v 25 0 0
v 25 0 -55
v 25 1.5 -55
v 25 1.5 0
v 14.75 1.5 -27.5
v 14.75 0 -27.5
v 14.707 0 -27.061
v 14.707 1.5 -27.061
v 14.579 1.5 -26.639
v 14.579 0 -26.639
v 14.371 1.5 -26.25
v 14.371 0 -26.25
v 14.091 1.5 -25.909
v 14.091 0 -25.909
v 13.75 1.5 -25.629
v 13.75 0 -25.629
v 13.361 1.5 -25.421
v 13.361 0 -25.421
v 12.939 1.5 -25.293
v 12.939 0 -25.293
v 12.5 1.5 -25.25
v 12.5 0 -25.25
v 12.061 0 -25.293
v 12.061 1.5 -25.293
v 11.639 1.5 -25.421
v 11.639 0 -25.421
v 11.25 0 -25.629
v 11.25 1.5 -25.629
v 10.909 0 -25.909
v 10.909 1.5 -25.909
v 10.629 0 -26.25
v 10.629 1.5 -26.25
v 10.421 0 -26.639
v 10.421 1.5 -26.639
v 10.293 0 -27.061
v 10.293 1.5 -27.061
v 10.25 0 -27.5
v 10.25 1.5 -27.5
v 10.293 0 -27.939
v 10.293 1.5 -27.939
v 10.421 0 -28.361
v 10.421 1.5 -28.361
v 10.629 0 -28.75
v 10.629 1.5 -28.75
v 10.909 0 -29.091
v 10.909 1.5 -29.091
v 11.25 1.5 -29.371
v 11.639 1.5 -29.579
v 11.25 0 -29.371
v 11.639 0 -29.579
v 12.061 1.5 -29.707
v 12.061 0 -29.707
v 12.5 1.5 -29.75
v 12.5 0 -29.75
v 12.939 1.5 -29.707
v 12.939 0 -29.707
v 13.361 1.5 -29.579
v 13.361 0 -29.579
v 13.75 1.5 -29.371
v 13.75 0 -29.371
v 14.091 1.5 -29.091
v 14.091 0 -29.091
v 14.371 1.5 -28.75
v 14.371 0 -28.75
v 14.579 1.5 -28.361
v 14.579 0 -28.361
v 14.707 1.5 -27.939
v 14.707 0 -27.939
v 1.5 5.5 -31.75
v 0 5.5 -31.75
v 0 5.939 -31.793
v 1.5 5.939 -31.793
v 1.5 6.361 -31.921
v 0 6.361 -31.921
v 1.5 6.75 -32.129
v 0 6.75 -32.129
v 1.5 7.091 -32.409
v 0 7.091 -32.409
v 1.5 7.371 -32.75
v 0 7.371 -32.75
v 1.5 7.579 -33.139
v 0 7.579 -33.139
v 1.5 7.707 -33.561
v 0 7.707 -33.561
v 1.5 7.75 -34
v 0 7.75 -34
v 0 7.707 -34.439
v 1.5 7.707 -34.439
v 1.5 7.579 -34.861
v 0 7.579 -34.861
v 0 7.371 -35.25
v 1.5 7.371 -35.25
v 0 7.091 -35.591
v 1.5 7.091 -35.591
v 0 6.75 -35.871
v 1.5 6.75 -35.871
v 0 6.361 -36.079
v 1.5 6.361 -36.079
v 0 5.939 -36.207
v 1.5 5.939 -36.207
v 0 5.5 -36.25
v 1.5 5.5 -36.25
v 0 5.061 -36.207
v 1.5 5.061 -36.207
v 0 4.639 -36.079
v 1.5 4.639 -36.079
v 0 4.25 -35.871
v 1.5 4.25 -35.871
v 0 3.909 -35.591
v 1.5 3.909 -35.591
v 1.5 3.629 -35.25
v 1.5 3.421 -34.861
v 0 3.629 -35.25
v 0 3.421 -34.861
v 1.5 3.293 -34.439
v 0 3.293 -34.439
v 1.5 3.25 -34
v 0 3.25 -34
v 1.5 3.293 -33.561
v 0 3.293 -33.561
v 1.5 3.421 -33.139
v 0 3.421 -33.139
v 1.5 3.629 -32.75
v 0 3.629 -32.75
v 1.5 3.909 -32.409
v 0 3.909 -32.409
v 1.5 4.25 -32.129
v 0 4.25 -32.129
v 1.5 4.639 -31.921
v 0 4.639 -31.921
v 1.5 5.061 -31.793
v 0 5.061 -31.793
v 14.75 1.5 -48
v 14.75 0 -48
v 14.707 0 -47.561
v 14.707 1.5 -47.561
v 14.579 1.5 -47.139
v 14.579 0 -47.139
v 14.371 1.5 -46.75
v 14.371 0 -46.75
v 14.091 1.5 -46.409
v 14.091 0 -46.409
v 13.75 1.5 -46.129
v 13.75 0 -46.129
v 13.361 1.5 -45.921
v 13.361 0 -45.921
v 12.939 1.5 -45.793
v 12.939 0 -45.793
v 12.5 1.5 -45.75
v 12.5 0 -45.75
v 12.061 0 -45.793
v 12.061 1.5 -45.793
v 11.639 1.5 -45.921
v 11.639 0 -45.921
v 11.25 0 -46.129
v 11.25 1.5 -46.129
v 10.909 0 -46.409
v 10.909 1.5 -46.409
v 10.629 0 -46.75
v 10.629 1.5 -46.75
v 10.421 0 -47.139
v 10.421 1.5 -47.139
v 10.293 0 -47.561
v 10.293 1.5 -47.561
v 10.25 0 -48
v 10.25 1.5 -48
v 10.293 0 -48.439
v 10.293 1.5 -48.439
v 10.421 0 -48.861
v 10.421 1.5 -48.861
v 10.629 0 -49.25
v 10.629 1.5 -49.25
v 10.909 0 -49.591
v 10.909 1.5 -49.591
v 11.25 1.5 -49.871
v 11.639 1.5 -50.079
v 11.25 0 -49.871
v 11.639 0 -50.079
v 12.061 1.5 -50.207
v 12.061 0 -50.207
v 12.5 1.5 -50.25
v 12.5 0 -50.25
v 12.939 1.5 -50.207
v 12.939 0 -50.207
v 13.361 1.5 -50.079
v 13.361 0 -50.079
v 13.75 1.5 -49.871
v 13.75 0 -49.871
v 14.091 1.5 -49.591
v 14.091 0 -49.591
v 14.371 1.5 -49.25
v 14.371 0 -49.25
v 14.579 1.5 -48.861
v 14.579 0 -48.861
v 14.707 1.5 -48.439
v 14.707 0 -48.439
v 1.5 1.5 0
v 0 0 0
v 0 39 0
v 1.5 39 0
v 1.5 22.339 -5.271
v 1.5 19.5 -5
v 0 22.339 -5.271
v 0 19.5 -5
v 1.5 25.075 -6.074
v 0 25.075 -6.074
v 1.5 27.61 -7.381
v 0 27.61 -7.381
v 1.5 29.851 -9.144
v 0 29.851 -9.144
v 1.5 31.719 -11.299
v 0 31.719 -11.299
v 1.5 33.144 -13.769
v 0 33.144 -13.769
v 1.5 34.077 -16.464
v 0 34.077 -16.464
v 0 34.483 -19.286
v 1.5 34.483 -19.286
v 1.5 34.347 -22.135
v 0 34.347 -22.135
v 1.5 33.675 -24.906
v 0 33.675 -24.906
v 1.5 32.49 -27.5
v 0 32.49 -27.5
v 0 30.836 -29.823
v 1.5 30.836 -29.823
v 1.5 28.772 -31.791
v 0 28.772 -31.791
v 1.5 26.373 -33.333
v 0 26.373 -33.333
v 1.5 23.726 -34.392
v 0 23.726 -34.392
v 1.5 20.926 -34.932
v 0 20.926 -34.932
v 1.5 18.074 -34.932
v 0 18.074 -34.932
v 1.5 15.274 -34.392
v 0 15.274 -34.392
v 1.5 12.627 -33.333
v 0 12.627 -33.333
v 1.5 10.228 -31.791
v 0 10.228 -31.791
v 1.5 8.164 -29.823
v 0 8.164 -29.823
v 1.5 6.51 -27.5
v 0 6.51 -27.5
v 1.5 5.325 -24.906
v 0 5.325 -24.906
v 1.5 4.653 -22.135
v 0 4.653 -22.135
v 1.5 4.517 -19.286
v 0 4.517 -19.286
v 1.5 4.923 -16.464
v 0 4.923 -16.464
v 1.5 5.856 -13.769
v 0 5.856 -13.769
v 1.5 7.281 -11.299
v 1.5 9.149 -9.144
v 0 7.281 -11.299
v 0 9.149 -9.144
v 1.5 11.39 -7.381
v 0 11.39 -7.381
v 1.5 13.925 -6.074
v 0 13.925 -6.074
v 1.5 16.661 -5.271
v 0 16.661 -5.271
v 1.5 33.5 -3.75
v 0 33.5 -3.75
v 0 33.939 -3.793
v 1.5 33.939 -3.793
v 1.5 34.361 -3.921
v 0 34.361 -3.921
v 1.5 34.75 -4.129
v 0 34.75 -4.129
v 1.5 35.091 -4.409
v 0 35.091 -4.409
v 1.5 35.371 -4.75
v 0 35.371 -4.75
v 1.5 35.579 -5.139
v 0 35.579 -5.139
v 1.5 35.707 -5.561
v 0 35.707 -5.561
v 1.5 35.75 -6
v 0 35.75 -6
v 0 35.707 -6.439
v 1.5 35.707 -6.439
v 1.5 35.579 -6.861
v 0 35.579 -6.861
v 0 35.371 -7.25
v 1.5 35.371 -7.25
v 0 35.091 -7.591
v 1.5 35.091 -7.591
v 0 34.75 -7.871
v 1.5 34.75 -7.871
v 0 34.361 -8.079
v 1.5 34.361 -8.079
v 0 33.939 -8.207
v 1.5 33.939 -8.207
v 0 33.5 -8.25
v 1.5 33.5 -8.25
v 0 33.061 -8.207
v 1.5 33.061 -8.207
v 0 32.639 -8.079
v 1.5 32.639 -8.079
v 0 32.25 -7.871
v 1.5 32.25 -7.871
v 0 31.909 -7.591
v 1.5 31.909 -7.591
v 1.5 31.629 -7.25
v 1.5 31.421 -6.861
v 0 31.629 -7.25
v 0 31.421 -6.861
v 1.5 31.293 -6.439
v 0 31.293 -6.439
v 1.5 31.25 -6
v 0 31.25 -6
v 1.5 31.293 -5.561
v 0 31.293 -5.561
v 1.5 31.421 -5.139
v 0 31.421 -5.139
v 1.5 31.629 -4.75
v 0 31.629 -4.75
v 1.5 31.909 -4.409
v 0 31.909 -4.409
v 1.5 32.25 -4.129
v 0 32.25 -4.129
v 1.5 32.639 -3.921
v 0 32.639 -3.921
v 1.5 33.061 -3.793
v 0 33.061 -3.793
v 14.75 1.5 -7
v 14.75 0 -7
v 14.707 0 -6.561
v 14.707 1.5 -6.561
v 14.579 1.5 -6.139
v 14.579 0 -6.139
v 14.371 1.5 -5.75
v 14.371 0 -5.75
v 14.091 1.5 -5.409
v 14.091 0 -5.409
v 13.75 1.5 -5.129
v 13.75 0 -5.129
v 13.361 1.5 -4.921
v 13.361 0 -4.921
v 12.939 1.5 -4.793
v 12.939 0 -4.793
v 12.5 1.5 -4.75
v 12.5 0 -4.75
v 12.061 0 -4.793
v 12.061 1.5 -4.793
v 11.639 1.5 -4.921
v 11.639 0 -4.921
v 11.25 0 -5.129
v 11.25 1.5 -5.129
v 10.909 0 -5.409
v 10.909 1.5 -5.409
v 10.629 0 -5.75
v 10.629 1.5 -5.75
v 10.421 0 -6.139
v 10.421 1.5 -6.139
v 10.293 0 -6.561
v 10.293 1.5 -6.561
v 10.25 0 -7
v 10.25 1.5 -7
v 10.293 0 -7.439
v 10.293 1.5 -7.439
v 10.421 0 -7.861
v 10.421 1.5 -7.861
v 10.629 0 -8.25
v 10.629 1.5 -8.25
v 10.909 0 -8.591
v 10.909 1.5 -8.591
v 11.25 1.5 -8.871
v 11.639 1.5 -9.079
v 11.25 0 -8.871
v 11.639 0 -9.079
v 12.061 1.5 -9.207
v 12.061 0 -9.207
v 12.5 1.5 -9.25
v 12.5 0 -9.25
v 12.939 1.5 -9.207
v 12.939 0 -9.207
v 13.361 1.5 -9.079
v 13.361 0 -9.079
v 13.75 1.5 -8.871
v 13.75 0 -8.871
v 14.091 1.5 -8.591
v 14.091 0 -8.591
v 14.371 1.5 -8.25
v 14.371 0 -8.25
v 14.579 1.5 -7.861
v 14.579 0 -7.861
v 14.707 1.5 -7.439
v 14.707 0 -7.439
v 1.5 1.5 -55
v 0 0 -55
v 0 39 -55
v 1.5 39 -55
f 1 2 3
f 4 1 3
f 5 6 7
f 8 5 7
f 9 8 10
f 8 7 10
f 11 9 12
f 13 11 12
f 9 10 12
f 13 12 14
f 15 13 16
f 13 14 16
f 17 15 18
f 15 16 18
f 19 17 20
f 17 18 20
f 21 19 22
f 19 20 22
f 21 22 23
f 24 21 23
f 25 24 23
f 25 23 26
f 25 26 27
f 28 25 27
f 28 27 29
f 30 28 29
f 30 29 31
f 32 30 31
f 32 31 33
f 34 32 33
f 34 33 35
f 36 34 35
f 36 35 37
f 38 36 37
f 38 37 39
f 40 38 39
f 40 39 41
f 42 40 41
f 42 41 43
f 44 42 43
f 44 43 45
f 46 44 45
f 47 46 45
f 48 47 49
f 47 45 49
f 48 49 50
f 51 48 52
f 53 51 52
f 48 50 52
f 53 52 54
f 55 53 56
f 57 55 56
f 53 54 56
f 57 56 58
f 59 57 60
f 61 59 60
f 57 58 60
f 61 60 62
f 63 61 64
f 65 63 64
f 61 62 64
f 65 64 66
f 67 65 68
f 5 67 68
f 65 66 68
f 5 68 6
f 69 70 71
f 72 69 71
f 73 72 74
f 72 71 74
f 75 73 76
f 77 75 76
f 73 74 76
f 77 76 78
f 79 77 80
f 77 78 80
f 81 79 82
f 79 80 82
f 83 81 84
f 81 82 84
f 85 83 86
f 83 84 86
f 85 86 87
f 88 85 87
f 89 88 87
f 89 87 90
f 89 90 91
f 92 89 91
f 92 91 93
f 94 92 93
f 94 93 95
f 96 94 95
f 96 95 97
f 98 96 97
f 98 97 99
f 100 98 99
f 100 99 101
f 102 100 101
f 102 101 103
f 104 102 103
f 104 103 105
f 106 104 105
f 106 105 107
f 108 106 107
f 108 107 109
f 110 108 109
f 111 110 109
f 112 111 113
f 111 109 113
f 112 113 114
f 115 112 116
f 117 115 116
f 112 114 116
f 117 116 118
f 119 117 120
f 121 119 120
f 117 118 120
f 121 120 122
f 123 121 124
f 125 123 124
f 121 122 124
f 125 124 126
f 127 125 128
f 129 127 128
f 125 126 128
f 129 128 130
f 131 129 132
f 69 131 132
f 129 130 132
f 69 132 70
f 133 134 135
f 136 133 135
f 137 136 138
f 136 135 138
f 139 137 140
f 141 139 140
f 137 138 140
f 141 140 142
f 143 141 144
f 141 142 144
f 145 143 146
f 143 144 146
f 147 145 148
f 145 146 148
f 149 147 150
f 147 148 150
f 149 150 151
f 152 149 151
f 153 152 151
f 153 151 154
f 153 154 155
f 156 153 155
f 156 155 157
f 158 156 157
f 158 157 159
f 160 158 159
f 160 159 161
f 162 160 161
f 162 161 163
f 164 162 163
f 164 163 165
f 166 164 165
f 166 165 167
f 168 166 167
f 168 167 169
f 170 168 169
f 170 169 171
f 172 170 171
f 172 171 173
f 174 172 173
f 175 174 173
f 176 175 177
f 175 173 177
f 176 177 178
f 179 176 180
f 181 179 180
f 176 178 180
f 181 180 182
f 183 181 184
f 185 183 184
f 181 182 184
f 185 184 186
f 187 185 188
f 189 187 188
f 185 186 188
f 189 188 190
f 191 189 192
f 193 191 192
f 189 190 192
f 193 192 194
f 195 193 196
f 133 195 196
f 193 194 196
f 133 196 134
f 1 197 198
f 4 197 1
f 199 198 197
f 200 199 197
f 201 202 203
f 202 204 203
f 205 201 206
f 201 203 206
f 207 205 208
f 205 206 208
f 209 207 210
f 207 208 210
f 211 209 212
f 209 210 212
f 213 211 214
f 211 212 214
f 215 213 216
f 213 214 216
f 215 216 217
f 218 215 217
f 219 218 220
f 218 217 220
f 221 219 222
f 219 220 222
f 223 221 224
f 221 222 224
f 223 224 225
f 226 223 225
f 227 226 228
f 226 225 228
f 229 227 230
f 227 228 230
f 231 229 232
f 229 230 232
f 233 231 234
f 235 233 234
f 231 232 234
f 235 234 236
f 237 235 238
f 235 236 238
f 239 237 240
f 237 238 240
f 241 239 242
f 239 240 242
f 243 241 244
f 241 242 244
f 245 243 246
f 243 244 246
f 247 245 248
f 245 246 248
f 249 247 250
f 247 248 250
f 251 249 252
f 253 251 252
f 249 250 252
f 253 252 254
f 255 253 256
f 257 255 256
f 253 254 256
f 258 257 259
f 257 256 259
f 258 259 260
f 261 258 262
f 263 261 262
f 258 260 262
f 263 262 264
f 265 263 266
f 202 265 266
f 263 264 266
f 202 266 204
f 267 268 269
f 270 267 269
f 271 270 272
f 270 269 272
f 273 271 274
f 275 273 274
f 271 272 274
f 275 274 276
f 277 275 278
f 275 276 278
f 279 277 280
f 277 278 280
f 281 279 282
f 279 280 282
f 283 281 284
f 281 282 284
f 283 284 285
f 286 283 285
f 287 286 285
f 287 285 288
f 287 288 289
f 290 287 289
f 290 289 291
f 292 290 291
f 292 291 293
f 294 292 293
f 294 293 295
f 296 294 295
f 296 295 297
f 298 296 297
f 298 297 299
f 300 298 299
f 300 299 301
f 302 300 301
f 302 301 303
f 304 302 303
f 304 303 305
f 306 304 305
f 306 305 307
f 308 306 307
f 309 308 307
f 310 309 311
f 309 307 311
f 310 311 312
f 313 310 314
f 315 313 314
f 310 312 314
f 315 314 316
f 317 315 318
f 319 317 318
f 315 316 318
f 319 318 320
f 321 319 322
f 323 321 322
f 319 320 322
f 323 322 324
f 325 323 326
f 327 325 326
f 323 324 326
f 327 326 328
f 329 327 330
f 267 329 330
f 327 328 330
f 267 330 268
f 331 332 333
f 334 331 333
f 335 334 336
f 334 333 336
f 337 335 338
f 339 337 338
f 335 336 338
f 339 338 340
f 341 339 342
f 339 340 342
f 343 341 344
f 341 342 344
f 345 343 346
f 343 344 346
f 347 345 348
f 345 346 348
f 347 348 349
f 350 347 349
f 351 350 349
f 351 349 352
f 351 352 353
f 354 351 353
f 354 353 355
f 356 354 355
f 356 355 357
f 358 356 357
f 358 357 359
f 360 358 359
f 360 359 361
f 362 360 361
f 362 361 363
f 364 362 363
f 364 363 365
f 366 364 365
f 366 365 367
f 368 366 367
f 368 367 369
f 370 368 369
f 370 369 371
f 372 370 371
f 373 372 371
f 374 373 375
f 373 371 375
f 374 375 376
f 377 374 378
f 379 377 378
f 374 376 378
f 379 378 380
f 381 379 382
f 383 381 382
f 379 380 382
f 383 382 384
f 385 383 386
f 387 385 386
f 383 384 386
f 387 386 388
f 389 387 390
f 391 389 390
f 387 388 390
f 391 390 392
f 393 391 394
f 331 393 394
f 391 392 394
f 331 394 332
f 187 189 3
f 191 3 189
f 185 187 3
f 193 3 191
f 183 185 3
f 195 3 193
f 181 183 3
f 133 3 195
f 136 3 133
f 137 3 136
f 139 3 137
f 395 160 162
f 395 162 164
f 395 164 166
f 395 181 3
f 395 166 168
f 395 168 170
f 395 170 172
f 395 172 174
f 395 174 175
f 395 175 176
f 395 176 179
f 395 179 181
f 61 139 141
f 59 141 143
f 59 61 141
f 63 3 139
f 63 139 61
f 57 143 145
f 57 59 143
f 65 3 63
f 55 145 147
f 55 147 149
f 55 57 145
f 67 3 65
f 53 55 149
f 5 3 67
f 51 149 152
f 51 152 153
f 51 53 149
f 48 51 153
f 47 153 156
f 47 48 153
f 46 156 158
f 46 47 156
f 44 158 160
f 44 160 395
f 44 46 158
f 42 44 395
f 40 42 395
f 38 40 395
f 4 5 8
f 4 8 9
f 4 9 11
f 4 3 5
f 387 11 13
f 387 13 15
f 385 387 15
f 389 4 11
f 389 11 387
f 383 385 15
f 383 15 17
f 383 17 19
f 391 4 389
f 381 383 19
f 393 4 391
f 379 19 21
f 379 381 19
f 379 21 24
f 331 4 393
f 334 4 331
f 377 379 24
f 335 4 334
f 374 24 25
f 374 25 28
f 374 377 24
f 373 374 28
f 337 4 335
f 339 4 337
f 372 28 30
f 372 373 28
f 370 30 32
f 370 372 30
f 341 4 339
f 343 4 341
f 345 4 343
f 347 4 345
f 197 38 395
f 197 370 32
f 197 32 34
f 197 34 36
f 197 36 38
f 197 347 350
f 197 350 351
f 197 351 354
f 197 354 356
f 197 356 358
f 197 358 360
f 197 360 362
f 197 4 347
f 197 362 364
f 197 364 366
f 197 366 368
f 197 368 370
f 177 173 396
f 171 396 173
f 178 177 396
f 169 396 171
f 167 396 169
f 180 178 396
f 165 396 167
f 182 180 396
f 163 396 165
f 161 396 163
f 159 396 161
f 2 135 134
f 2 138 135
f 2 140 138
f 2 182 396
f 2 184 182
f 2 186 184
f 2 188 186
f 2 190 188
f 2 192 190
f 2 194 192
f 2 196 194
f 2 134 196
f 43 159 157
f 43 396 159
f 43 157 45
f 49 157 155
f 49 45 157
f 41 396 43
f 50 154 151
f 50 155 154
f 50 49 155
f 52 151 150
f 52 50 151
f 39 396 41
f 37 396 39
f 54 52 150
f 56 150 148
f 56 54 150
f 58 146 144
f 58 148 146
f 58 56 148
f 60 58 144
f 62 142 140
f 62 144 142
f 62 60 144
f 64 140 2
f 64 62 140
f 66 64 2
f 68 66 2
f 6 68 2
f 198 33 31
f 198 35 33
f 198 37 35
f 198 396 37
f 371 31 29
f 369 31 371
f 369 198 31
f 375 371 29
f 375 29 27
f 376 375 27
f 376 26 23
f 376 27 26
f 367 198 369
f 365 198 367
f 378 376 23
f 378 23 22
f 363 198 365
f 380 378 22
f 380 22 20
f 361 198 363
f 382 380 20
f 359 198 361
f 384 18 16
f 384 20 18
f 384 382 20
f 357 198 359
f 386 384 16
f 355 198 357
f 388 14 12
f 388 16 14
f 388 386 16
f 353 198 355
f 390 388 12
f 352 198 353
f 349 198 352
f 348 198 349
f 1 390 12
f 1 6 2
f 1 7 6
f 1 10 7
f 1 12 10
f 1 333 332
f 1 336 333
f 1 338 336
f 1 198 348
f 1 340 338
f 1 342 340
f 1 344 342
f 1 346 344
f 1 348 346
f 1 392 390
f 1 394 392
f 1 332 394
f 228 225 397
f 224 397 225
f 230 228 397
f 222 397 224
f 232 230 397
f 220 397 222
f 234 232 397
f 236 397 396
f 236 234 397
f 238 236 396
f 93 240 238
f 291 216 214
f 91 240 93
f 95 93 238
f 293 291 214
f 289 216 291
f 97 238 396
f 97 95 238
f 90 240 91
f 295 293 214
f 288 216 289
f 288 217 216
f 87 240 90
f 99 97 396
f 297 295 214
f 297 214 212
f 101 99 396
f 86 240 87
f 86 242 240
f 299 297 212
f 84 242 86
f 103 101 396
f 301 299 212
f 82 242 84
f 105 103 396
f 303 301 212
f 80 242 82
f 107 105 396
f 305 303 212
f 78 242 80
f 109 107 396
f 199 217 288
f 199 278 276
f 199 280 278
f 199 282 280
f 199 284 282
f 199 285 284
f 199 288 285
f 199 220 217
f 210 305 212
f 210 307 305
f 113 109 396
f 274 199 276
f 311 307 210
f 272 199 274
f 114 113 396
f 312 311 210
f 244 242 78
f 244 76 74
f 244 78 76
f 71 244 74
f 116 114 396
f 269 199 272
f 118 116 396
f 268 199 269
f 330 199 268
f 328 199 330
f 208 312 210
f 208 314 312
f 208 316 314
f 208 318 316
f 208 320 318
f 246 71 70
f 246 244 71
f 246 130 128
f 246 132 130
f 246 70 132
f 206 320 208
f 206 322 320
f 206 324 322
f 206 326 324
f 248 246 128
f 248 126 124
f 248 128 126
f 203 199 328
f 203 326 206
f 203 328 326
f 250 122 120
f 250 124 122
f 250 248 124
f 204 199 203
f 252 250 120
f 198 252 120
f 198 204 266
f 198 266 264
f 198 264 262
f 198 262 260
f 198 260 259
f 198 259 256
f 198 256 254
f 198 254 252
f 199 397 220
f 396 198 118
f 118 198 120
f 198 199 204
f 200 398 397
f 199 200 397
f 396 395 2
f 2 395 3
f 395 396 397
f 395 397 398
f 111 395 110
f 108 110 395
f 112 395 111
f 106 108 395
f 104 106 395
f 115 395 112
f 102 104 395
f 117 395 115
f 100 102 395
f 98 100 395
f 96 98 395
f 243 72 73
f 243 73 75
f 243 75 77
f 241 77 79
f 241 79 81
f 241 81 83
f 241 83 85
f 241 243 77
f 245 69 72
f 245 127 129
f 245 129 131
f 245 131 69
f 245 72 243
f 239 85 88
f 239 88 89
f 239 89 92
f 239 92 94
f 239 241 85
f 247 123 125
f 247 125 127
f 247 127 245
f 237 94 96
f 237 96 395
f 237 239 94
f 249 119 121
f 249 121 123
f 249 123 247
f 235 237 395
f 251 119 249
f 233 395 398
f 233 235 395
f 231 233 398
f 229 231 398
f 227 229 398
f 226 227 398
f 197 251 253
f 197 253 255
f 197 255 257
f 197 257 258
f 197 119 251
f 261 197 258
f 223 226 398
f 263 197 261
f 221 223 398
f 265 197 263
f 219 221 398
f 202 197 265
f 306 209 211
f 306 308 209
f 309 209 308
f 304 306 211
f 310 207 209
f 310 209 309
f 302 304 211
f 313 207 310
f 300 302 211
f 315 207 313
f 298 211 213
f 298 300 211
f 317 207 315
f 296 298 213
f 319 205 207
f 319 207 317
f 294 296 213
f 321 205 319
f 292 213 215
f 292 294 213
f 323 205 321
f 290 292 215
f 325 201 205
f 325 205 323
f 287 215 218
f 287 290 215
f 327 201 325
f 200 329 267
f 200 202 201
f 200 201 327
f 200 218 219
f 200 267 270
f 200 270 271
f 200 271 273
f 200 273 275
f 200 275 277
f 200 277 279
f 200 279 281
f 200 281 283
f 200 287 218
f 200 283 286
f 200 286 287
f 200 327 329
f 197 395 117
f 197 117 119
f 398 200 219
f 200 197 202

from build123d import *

# Parameters (mm, degrees)
EXTRU_MINCE1_DEPTH    = 55
D_GAGEMENT_M41_D      = 4.5
D_GAGEMENT_M42_D      = 4.5
D_GAGEMENT_M271_D     = 30
D_GAGEMENT_M271_DEPTH = 1.5
D_GAGEMENT_M271_TIP   = 9.012909285


with BuildPart() as part:
    # Esquisse1 → Extru.-Mince1 (new body)
    with BuildSketch(Plane.XY):
        Polygon((0, 39), (0, 0), (25, 0), (25, 1.5), (1.5, 1.5), (1.5, 39), align=None)
    extrude(amount=-EXTRU_MINCE1_DEPTH)

    # Dégagement M41 (through all)
    with Locations(Plane(origin=(0, 1.5, 0), x_dir=(-1, 0, 0), z_dir=(0, 1, 0))):
        with Locations((-12.5, -7), (-12.5, -27.5), (-12.5, -48)):
            Hole(D_GAGEMENT_M41_D / 2)

    # Dégagement M42 (through all)
    with Locations(Plane(origin=(1.5, 0, 0), x_dir=(0, 0, -1), z_dir=(1, 0, 0))):
        with Locations((6, 33.5), (34, 5.5)):
            Hole(D_GAGEMENT_M42_D / 2)

    # Dégagement M271
    with Locations(Plane(origin=(1.5, 0, 0), x_dir=(0, 0, -1), z_dir=(1, 0, 0))):
        with Locations((20, 19.5)):
            Hole(D_GAGEMENT_M271_D / 2, depth=D_GAGEMENT_M271_DEPTH)
            with Locations((0, 0, -(D_GAGEMENT_M271_DEPTH + D_GAGEMENT_M271_TIP / 2))):  # 118° drill point
                Cone(0, D_GAGEMENT_M271_D / 2, D_GAGEMENT_M271_TIP, mode=Mode.SUBTRACT)


solid = part.part
